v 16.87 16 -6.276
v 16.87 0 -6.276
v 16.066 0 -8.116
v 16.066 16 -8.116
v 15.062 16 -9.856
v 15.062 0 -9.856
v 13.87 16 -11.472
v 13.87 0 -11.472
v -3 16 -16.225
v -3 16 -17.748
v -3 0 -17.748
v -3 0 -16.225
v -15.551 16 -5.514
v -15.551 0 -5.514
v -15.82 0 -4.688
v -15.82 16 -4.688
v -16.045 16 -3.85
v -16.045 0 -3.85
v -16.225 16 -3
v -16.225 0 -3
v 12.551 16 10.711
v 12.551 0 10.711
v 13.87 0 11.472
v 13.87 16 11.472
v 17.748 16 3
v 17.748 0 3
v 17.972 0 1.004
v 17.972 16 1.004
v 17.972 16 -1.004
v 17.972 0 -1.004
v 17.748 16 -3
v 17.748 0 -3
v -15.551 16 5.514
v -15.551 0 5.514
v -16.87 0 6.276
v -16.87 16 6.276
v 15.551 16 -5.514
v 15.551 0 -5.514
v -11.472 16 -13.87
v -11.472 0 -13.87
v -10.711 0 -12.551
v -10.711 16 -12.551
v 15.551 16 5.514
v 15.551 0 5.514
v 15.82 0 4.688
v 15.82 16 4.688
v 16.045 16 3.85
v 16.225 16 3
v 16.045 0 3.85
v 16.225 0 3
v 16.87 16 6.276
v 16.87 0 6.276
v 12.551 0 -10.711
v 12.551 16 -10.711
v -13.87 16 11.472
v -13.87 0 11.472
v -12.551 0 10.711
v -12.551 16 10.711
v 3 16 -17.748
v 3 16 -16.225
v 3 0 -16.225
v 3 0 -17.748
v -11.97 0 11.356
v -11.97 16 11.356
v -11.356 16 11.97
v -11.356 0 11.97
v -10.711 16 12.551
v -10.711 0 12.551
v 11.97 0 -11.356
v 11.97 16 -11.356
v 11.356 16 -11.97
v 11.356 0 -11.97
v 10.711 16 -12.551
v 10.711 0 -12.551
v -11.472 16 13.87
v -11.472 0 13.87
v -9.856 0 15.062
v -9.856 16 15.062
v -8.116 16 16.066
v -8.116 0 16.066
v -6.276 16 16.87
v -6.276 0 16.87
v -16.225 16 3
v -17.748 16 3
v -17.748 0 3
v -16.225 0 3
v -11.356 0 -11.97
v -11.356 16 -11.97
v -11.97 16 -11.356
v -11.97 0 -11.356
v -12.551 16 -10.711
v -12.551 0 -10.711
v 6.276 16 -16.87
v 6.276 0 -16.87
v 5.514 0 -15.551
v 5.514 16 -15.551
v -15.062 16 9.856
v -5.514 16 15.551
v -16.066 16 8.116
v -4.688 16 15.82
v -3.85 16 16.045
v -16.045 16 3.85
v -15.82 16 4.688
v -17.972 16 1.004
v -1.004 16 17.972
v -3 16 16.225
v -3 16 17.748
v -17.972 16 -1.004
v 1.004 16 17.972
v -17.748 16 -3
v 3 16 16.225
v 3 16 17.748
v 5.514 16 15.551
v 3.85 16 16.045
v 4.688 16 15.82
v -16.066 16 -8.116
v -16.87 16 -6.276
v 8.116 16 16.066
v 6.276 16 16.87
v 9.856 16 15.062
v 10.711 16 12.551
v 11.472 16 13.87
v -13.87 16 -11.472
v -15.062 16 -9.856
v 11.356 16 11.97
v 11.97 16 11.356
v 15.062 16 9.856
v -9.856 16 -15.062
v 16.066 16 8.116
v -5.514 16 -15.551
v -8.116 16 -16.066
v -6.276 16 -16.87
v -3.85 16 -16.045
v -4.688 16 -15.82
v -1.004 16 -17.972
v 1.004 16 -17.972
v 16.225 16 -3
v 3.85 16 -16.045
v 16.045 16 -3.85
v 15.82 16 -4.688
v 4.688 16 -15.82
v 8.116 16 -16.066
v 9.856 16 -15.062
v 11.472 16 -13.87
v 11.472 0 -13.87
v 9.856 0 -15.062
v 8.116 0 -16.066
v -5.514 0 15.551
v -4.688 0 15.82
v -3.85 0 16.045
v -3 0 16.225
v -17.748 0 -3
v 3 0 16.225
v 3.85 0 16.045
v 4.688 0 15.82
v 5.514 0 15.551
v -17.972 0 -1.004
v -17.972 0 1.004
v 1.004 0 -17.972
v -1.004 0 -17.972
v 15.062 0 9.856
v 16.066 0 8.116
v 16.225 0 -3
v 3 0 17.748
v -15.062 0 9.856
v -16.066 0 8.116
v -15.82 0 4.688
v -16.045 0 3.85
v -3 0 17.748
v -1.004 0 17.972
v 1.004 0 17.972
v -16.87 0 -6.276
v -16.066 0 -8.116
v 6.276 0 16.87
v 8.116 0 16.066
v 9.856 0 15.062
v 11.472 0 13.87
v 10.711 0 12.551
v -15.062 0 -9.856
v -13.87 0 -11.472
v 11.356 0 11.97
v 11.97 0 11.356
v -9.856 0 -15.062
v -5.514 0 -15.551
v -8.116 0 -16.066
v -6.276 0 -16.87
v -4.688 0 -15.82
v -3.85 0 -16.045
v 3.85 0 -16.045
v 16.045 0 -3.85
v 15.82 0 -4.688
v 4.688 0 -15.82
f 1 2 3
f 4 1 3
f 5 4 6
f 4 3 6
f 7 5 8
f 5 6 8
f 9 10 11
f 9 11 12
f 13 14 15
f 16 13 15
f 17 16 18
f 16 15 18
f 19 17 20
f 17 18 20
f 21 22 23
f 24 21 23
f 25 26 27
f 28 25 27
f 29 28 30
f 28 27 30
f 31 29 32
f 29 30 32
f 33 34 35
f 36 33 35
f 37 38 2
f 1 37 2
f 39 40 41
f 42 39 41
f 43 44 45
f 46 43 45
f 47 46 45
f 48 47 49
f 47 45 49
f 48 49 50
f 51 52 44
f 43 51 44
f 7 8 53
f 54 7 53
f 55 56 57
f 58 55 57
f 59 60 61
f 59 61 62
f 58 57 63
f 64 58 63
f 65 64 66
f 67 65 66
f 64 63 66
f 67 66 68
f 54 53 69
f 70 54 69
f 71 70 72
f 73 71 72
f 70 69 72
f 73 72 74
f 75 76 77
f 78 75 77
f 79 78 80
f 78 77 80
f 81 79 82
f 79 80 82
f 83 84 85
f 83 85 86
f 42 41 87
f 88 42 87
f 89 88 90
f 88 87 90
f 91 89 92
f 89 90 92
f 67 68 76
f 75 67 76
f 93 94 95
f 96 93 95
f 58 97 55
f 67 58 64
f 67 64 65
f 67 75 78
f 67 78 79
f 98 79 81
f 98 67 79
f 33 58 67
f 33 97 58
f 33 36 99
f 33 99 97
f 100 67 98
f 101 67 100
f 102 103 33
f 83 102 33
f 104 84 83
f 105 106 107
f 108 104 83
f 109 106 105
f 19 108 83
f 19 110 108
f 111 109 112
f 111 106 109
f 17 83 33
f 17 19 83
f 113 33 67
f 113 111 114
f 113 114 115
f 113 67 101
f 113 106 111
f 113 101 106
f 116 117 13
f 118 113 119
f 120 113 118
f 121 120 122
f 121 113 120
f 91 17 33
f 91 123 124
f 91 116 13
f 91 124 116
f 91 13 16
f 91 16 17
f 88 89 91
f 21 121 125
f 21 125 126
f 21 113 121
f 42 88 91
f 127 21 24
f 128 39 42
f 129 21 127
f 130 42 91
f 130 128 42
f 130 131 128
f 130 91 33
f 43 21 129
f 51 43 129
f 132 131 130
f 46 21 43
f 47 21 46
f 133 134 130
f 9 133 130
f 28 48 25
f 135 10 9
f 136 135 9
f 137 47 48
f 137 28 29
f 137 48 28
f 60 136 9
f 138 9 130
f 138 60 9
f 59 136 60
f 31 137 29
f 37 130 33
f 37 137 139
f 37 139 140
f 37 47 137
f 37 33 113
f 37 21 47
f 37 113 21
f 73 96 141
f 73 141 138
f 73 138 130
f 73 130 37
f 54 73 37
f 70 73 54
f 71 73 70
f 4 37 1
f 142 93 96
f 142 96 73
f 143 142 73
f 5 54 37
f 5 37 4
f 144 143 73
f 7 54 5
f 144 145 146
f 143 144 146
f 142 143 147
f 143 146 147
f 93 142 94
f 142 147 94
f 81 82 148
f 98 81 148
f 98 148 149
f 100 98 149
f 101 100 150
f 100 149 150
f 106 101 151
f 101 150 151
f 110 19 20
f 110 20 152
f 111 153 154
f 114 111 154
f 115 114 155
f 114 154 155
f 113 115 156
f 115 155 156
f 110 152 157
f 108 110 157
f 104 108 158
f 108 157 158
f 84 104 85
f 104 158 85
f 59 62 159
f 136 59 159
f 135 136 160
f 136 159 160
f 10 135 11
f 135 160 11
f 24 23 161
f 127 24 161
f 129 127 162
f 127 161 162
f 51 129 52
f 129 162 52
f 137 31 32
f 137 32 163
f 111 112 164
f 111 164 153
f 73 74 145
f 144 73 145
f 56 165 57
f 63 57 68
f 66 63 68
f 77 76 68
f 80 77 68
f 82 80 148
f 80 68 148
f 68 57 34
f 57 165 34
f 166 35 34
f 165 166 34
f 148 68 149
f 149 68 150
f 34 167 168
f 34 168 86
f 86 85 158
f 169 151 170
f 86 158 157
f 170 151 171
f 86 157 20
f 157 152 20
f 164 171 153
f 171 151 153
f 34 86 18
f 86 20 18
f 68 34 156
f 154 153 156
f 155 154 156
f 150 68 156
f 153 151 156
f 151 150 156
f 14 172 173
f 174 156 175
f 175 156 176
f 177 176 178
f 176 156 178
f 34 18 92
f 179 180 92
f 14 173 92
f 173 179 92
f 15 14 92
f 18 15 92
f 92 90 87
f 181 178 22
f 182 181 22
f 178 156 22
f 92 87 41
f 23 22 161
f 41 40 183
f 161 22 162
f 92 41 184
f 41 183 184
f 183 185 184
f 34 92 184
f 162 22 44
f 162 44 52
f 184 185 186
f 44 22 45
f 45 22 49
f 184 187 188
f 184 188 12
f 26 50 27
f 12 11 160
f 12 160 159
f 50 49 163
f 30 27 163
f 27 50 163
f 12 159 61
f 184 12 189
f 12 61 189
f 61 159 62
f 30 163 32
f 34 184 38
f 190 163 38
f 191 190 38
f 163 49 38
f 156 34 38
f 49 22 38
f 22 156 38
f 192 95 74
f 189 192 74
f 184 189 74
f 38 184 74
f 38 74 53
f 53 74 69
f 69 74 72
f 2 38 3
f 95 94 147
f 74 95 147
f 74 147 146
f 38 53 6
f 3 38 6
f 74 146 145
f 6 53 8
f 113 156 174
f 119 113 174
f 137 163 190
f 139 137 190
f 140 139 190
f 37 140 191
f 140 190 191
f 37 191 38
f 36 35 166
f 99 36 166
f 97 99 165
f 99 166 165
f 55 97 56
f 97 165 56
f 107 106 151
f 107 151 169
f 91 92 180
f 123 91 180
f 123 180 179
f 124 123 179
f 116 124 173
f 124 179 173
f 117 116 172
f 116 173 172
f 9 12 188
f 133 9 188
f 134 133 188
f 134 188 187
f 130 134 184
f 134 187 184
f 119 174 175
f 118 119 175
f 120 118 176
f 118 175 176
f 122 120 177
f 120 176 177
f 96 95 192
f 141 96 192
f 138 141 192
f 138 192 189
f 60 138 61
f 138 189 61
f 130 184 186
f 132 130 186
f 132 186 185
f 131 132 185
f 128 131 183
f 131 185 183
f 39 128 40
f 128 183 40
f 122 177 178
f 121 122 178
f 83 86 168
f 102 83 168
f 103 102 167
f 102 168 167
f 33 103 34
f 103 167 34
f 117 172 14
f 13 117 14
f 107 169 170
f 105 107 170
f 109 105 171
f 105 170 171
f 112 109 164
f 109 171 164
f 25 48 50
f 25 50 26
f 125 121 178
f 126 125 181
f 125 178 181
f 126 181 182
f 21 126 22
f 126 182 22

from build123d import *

# Parameters (mm, degrees)
EXTRUDE_1_DEPTH = 16


with BuildPart() as part:
    # 스케치1 → 보스-돌출1 (new body)
    with BuildSketch(Plane(origin=(0, 0, 0), x_dir=(1, 0, 0), z_dir=(0, 1, 0))):
        with BuildLine():
            ThreePointArc((3, 17.748239349), (0, 18), (-3, 17.748239349))
            Line((-3, 17.748239349), (-3, 16.22498074))
            ThreePointArc((-3, 16.22498074), (-4.270514244, 15.937776134), (-5.514414158, 15.551245496))
            Line((-5.514414158, 15.551245496), (-6.276043463, 16.870426149))
            ThreePointArc((-6.276043463, 16.870426149), (-9, 15.588457268), (-11.472195886, 13.870426149))
            Line((-11.472195886, 13.870426149), (-10.710566581, 12.551245496))
            ThreePointArc((-10.710566581, 12.551245496), (-11.66726189, 11.66726189), (-12.551245496, 10.710566581))
            Line((-12.551245496, 10.710566581), (-13.870426149, 11.472195886))
            ThreePointArc((-13.870426149, 11.472195886), (-15.588457268, 9), (-16.870426149, 6.276043463))
            Line((-16.870426149, 6.276043463), (-15.551245496, 5.514414158))
            ThreePointArc((-15.551245496, 5.514414158), (-15.937776134, 4.270514244), (-16.22498074, 3))
            Line((-16.22498074, 3), (-17.748239349, 3))
            ThreePointArc((-17.748239349, 3), (-18, 0), (-17.748239349, -3))
            Line((-17.748239349, -3), (-16.22498074, -3))
            ThreePointArc((-16.22498074, -3), (-15.937776134, -4.270514244), (-15.551245496, -5.514414158))
            Line((-15.551245496, -5.514414158), (-16.870426149, -6.276043463))
            ThreePointArc((-16.870426149, -6.276043463), (-15.588457268, -9), (-13.870426149, -11.472195886))
            Line((-13.870426149, -11.472195886), (-12.551245496, -10.710566581))
            ThreePointArc((-12.551245496, -10.710566581), (-11.66726189, -11.66726189), (-10.710566581, -12.551245496))
            Line((-10.710566581, -12.551245496), (-11.472195886, -13.870426149))
            ThreePointArc((-11.472195886, -13.870426149), (-9, -15.588457268), (-6.276043463, -16.870426149))
            Line((-6.276043463, -16.870426149), (-5.514414158, -15.551245496))
            ThreePointArc((-5.514414158, -15.551245496), (-4.270514244, -15.937776134), (-3, -16.22498074))
            Line((-3, -16.22498074), (-3, -17.748239349))
            ThreePointArc((-3, -17.748239349), (0, -18), (3, -17.748239349))
            Line((3, -17.748239349), (3, -16.22498074))
            ThreePointArc((3, -16.22498074), (4.270514244, -15.937776134), (5.514414158, -15.551245496))
            Line((5.514414158, -15.551245496), (6.276043463, -16.870426149))
            ThreePointArc((6.276043463, -16.870426149), (9, -15.588457268), (11.472195886, -13.870426149))
            Line((11.472195886, -13.870426149), (10.710566581, -12.551245496))
            ThreePointArc((10.710566581, -12.551245496), (11.66726189, -11.66726189), (12.551245496, -10.710566581))
            Line((12.551245496, -10.710566581), (13.870426149, -11.472195886))
            ThreePointArc((13.870426149, -11.472195886), (15.588457268, -9), (16.870426149, -6.276043463))
            Line((16.870426149, -6.276043463), (15.551245496, -5.514414158))
            ThreePointArc((15.551245496, -5.514414158), (15.937776134, -4.270514244), (16.22498074, -3))
            Line((16.22498074, -3), (17.748239349, -3))
            ThreePointArc((17.748239349, -3), (18, 0), (17.748239349, 3))
            Line((17.748239349, 3), (16.22498074, 3))
            ThreePointArc((16.22498074, 3), (15.937776134, 4.270514244), (15.551245496, 5.514414158))
            Line((15.551245496, 5.514414158), (16.870426149, 6.276043463))
            ThreePointArc((16.870426149, 6.276043463), (15.588457268, 9), (13.870426149, 11.472195886))
            Line((13.870426149, 11.472195886), (12.551245496, 10.710566581))
            ThreePointArc((12.551245496, 10.710566581), (11.66726189, 11.66726189), (10.710566581, 12.551245496))
            Line((10.710566581, 12.551245496), (11.472195886, 13.870426149))
            ThreePointArc((11.472195886, 13.870426149), (9, 15.588457268), (6.276043463, 16.870426149))
            Line((6.276043463, 16.870426149), (5.514414158, 15.551245496))
            ThreePointArc((5.514414158, 15.551245496), (4.270514244, 15.937776134), (3, 16.22498074))
            Line((3, 16.22498074), (3, 17.748239349))
        make_face()
    extrude(amount=EXTRUDE_1_DEPTH)


solid = part.part
